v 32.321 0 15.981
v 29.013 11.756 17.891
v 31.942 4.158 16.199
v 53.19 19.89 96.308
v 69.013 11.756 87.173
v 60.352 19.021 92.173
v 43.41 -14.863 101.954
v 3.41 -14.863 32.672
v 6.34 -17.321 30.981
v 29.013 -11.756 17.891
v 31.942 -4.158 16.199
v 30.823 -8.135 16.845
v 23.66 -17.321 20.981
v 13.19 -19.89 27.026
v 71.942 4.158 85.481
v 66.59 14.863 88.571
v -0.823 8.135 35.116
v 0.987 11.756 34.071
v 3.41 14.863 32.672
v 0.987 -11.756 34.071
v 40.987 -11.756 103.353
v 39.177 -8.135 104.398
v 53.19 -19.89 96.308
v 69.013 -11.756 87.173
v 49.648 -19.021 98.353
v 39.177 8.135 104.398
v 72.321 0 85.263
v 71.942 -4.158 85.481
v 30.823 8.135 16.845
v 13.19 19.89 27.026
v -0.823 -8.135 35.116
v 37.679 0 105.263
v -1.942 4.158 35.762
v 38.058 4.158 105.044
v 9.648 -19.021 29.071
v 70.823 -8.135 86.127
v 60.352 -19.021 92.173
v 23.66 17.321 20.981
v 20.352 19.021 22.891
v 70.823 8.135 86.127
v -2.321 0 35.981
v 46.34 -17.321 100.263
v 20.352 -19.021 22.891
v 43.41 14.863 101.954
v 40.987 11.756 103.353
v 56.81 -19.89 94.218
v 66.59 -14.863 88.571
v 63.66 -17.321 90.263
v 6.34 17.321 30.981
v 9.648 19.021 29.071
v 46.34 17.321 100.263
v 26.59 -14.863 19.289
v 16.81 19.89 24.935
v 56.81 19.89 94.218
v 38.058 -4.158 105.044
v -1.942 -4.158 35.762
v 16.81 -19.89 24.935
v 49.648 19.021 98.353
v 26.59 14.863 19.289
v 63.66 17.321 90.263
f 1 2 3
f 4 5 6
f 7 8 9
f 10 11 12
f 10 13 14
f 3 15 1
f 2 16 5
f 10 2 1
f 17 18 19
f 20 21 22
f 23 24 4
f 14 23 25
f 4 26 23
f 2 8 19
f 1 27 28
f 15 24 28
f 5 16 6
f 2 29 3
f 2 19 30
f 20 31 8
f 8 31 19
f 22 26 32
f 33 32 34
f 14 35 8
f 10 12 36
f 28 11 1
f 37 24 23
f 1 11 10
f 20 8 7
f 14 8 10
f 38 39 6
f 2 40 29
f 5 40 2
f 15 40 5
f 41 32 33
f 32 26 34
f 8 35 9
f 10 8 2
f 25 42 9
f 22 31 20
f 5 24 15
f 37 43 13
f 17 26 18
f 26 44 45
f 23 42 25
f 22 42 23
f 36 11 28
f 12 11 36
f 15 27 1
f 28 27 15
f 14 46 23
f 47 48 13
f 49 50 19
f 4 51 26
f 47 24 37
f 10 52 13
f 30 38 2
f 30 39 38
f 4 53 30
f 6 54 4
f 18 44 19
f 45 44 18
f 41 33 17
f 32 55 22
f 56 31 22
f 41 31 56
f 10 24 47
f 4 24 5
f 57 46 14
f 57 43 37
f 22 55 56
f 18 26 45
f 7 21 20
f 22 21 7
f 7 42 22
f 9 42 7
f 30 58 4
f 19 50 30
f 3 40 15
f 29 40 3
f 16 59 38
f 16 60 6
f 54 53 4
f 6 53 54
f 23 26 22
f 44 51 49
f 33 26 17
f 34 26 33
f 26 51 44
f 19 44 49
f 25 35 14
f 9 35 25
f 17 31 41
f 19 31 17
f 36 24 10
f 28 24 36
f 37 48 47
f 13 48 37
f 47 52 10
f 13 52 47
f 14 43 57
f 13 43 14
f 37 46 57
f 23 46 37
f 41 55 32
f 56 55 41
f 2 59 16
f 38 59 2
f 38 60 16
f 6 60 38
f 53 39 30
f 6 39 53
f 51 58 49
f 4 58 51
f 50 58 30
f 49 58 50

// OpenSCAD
hull(){
     rotate(30,[0,1,0]) translate([0,0,30]) cylinder(h=40,r1=20,r2=10, center = false);
     rotate(30,[0,1,0])	translate([0,0,80]) cylinder(h=30,r1=15,r2=20, center = false);	       
}
